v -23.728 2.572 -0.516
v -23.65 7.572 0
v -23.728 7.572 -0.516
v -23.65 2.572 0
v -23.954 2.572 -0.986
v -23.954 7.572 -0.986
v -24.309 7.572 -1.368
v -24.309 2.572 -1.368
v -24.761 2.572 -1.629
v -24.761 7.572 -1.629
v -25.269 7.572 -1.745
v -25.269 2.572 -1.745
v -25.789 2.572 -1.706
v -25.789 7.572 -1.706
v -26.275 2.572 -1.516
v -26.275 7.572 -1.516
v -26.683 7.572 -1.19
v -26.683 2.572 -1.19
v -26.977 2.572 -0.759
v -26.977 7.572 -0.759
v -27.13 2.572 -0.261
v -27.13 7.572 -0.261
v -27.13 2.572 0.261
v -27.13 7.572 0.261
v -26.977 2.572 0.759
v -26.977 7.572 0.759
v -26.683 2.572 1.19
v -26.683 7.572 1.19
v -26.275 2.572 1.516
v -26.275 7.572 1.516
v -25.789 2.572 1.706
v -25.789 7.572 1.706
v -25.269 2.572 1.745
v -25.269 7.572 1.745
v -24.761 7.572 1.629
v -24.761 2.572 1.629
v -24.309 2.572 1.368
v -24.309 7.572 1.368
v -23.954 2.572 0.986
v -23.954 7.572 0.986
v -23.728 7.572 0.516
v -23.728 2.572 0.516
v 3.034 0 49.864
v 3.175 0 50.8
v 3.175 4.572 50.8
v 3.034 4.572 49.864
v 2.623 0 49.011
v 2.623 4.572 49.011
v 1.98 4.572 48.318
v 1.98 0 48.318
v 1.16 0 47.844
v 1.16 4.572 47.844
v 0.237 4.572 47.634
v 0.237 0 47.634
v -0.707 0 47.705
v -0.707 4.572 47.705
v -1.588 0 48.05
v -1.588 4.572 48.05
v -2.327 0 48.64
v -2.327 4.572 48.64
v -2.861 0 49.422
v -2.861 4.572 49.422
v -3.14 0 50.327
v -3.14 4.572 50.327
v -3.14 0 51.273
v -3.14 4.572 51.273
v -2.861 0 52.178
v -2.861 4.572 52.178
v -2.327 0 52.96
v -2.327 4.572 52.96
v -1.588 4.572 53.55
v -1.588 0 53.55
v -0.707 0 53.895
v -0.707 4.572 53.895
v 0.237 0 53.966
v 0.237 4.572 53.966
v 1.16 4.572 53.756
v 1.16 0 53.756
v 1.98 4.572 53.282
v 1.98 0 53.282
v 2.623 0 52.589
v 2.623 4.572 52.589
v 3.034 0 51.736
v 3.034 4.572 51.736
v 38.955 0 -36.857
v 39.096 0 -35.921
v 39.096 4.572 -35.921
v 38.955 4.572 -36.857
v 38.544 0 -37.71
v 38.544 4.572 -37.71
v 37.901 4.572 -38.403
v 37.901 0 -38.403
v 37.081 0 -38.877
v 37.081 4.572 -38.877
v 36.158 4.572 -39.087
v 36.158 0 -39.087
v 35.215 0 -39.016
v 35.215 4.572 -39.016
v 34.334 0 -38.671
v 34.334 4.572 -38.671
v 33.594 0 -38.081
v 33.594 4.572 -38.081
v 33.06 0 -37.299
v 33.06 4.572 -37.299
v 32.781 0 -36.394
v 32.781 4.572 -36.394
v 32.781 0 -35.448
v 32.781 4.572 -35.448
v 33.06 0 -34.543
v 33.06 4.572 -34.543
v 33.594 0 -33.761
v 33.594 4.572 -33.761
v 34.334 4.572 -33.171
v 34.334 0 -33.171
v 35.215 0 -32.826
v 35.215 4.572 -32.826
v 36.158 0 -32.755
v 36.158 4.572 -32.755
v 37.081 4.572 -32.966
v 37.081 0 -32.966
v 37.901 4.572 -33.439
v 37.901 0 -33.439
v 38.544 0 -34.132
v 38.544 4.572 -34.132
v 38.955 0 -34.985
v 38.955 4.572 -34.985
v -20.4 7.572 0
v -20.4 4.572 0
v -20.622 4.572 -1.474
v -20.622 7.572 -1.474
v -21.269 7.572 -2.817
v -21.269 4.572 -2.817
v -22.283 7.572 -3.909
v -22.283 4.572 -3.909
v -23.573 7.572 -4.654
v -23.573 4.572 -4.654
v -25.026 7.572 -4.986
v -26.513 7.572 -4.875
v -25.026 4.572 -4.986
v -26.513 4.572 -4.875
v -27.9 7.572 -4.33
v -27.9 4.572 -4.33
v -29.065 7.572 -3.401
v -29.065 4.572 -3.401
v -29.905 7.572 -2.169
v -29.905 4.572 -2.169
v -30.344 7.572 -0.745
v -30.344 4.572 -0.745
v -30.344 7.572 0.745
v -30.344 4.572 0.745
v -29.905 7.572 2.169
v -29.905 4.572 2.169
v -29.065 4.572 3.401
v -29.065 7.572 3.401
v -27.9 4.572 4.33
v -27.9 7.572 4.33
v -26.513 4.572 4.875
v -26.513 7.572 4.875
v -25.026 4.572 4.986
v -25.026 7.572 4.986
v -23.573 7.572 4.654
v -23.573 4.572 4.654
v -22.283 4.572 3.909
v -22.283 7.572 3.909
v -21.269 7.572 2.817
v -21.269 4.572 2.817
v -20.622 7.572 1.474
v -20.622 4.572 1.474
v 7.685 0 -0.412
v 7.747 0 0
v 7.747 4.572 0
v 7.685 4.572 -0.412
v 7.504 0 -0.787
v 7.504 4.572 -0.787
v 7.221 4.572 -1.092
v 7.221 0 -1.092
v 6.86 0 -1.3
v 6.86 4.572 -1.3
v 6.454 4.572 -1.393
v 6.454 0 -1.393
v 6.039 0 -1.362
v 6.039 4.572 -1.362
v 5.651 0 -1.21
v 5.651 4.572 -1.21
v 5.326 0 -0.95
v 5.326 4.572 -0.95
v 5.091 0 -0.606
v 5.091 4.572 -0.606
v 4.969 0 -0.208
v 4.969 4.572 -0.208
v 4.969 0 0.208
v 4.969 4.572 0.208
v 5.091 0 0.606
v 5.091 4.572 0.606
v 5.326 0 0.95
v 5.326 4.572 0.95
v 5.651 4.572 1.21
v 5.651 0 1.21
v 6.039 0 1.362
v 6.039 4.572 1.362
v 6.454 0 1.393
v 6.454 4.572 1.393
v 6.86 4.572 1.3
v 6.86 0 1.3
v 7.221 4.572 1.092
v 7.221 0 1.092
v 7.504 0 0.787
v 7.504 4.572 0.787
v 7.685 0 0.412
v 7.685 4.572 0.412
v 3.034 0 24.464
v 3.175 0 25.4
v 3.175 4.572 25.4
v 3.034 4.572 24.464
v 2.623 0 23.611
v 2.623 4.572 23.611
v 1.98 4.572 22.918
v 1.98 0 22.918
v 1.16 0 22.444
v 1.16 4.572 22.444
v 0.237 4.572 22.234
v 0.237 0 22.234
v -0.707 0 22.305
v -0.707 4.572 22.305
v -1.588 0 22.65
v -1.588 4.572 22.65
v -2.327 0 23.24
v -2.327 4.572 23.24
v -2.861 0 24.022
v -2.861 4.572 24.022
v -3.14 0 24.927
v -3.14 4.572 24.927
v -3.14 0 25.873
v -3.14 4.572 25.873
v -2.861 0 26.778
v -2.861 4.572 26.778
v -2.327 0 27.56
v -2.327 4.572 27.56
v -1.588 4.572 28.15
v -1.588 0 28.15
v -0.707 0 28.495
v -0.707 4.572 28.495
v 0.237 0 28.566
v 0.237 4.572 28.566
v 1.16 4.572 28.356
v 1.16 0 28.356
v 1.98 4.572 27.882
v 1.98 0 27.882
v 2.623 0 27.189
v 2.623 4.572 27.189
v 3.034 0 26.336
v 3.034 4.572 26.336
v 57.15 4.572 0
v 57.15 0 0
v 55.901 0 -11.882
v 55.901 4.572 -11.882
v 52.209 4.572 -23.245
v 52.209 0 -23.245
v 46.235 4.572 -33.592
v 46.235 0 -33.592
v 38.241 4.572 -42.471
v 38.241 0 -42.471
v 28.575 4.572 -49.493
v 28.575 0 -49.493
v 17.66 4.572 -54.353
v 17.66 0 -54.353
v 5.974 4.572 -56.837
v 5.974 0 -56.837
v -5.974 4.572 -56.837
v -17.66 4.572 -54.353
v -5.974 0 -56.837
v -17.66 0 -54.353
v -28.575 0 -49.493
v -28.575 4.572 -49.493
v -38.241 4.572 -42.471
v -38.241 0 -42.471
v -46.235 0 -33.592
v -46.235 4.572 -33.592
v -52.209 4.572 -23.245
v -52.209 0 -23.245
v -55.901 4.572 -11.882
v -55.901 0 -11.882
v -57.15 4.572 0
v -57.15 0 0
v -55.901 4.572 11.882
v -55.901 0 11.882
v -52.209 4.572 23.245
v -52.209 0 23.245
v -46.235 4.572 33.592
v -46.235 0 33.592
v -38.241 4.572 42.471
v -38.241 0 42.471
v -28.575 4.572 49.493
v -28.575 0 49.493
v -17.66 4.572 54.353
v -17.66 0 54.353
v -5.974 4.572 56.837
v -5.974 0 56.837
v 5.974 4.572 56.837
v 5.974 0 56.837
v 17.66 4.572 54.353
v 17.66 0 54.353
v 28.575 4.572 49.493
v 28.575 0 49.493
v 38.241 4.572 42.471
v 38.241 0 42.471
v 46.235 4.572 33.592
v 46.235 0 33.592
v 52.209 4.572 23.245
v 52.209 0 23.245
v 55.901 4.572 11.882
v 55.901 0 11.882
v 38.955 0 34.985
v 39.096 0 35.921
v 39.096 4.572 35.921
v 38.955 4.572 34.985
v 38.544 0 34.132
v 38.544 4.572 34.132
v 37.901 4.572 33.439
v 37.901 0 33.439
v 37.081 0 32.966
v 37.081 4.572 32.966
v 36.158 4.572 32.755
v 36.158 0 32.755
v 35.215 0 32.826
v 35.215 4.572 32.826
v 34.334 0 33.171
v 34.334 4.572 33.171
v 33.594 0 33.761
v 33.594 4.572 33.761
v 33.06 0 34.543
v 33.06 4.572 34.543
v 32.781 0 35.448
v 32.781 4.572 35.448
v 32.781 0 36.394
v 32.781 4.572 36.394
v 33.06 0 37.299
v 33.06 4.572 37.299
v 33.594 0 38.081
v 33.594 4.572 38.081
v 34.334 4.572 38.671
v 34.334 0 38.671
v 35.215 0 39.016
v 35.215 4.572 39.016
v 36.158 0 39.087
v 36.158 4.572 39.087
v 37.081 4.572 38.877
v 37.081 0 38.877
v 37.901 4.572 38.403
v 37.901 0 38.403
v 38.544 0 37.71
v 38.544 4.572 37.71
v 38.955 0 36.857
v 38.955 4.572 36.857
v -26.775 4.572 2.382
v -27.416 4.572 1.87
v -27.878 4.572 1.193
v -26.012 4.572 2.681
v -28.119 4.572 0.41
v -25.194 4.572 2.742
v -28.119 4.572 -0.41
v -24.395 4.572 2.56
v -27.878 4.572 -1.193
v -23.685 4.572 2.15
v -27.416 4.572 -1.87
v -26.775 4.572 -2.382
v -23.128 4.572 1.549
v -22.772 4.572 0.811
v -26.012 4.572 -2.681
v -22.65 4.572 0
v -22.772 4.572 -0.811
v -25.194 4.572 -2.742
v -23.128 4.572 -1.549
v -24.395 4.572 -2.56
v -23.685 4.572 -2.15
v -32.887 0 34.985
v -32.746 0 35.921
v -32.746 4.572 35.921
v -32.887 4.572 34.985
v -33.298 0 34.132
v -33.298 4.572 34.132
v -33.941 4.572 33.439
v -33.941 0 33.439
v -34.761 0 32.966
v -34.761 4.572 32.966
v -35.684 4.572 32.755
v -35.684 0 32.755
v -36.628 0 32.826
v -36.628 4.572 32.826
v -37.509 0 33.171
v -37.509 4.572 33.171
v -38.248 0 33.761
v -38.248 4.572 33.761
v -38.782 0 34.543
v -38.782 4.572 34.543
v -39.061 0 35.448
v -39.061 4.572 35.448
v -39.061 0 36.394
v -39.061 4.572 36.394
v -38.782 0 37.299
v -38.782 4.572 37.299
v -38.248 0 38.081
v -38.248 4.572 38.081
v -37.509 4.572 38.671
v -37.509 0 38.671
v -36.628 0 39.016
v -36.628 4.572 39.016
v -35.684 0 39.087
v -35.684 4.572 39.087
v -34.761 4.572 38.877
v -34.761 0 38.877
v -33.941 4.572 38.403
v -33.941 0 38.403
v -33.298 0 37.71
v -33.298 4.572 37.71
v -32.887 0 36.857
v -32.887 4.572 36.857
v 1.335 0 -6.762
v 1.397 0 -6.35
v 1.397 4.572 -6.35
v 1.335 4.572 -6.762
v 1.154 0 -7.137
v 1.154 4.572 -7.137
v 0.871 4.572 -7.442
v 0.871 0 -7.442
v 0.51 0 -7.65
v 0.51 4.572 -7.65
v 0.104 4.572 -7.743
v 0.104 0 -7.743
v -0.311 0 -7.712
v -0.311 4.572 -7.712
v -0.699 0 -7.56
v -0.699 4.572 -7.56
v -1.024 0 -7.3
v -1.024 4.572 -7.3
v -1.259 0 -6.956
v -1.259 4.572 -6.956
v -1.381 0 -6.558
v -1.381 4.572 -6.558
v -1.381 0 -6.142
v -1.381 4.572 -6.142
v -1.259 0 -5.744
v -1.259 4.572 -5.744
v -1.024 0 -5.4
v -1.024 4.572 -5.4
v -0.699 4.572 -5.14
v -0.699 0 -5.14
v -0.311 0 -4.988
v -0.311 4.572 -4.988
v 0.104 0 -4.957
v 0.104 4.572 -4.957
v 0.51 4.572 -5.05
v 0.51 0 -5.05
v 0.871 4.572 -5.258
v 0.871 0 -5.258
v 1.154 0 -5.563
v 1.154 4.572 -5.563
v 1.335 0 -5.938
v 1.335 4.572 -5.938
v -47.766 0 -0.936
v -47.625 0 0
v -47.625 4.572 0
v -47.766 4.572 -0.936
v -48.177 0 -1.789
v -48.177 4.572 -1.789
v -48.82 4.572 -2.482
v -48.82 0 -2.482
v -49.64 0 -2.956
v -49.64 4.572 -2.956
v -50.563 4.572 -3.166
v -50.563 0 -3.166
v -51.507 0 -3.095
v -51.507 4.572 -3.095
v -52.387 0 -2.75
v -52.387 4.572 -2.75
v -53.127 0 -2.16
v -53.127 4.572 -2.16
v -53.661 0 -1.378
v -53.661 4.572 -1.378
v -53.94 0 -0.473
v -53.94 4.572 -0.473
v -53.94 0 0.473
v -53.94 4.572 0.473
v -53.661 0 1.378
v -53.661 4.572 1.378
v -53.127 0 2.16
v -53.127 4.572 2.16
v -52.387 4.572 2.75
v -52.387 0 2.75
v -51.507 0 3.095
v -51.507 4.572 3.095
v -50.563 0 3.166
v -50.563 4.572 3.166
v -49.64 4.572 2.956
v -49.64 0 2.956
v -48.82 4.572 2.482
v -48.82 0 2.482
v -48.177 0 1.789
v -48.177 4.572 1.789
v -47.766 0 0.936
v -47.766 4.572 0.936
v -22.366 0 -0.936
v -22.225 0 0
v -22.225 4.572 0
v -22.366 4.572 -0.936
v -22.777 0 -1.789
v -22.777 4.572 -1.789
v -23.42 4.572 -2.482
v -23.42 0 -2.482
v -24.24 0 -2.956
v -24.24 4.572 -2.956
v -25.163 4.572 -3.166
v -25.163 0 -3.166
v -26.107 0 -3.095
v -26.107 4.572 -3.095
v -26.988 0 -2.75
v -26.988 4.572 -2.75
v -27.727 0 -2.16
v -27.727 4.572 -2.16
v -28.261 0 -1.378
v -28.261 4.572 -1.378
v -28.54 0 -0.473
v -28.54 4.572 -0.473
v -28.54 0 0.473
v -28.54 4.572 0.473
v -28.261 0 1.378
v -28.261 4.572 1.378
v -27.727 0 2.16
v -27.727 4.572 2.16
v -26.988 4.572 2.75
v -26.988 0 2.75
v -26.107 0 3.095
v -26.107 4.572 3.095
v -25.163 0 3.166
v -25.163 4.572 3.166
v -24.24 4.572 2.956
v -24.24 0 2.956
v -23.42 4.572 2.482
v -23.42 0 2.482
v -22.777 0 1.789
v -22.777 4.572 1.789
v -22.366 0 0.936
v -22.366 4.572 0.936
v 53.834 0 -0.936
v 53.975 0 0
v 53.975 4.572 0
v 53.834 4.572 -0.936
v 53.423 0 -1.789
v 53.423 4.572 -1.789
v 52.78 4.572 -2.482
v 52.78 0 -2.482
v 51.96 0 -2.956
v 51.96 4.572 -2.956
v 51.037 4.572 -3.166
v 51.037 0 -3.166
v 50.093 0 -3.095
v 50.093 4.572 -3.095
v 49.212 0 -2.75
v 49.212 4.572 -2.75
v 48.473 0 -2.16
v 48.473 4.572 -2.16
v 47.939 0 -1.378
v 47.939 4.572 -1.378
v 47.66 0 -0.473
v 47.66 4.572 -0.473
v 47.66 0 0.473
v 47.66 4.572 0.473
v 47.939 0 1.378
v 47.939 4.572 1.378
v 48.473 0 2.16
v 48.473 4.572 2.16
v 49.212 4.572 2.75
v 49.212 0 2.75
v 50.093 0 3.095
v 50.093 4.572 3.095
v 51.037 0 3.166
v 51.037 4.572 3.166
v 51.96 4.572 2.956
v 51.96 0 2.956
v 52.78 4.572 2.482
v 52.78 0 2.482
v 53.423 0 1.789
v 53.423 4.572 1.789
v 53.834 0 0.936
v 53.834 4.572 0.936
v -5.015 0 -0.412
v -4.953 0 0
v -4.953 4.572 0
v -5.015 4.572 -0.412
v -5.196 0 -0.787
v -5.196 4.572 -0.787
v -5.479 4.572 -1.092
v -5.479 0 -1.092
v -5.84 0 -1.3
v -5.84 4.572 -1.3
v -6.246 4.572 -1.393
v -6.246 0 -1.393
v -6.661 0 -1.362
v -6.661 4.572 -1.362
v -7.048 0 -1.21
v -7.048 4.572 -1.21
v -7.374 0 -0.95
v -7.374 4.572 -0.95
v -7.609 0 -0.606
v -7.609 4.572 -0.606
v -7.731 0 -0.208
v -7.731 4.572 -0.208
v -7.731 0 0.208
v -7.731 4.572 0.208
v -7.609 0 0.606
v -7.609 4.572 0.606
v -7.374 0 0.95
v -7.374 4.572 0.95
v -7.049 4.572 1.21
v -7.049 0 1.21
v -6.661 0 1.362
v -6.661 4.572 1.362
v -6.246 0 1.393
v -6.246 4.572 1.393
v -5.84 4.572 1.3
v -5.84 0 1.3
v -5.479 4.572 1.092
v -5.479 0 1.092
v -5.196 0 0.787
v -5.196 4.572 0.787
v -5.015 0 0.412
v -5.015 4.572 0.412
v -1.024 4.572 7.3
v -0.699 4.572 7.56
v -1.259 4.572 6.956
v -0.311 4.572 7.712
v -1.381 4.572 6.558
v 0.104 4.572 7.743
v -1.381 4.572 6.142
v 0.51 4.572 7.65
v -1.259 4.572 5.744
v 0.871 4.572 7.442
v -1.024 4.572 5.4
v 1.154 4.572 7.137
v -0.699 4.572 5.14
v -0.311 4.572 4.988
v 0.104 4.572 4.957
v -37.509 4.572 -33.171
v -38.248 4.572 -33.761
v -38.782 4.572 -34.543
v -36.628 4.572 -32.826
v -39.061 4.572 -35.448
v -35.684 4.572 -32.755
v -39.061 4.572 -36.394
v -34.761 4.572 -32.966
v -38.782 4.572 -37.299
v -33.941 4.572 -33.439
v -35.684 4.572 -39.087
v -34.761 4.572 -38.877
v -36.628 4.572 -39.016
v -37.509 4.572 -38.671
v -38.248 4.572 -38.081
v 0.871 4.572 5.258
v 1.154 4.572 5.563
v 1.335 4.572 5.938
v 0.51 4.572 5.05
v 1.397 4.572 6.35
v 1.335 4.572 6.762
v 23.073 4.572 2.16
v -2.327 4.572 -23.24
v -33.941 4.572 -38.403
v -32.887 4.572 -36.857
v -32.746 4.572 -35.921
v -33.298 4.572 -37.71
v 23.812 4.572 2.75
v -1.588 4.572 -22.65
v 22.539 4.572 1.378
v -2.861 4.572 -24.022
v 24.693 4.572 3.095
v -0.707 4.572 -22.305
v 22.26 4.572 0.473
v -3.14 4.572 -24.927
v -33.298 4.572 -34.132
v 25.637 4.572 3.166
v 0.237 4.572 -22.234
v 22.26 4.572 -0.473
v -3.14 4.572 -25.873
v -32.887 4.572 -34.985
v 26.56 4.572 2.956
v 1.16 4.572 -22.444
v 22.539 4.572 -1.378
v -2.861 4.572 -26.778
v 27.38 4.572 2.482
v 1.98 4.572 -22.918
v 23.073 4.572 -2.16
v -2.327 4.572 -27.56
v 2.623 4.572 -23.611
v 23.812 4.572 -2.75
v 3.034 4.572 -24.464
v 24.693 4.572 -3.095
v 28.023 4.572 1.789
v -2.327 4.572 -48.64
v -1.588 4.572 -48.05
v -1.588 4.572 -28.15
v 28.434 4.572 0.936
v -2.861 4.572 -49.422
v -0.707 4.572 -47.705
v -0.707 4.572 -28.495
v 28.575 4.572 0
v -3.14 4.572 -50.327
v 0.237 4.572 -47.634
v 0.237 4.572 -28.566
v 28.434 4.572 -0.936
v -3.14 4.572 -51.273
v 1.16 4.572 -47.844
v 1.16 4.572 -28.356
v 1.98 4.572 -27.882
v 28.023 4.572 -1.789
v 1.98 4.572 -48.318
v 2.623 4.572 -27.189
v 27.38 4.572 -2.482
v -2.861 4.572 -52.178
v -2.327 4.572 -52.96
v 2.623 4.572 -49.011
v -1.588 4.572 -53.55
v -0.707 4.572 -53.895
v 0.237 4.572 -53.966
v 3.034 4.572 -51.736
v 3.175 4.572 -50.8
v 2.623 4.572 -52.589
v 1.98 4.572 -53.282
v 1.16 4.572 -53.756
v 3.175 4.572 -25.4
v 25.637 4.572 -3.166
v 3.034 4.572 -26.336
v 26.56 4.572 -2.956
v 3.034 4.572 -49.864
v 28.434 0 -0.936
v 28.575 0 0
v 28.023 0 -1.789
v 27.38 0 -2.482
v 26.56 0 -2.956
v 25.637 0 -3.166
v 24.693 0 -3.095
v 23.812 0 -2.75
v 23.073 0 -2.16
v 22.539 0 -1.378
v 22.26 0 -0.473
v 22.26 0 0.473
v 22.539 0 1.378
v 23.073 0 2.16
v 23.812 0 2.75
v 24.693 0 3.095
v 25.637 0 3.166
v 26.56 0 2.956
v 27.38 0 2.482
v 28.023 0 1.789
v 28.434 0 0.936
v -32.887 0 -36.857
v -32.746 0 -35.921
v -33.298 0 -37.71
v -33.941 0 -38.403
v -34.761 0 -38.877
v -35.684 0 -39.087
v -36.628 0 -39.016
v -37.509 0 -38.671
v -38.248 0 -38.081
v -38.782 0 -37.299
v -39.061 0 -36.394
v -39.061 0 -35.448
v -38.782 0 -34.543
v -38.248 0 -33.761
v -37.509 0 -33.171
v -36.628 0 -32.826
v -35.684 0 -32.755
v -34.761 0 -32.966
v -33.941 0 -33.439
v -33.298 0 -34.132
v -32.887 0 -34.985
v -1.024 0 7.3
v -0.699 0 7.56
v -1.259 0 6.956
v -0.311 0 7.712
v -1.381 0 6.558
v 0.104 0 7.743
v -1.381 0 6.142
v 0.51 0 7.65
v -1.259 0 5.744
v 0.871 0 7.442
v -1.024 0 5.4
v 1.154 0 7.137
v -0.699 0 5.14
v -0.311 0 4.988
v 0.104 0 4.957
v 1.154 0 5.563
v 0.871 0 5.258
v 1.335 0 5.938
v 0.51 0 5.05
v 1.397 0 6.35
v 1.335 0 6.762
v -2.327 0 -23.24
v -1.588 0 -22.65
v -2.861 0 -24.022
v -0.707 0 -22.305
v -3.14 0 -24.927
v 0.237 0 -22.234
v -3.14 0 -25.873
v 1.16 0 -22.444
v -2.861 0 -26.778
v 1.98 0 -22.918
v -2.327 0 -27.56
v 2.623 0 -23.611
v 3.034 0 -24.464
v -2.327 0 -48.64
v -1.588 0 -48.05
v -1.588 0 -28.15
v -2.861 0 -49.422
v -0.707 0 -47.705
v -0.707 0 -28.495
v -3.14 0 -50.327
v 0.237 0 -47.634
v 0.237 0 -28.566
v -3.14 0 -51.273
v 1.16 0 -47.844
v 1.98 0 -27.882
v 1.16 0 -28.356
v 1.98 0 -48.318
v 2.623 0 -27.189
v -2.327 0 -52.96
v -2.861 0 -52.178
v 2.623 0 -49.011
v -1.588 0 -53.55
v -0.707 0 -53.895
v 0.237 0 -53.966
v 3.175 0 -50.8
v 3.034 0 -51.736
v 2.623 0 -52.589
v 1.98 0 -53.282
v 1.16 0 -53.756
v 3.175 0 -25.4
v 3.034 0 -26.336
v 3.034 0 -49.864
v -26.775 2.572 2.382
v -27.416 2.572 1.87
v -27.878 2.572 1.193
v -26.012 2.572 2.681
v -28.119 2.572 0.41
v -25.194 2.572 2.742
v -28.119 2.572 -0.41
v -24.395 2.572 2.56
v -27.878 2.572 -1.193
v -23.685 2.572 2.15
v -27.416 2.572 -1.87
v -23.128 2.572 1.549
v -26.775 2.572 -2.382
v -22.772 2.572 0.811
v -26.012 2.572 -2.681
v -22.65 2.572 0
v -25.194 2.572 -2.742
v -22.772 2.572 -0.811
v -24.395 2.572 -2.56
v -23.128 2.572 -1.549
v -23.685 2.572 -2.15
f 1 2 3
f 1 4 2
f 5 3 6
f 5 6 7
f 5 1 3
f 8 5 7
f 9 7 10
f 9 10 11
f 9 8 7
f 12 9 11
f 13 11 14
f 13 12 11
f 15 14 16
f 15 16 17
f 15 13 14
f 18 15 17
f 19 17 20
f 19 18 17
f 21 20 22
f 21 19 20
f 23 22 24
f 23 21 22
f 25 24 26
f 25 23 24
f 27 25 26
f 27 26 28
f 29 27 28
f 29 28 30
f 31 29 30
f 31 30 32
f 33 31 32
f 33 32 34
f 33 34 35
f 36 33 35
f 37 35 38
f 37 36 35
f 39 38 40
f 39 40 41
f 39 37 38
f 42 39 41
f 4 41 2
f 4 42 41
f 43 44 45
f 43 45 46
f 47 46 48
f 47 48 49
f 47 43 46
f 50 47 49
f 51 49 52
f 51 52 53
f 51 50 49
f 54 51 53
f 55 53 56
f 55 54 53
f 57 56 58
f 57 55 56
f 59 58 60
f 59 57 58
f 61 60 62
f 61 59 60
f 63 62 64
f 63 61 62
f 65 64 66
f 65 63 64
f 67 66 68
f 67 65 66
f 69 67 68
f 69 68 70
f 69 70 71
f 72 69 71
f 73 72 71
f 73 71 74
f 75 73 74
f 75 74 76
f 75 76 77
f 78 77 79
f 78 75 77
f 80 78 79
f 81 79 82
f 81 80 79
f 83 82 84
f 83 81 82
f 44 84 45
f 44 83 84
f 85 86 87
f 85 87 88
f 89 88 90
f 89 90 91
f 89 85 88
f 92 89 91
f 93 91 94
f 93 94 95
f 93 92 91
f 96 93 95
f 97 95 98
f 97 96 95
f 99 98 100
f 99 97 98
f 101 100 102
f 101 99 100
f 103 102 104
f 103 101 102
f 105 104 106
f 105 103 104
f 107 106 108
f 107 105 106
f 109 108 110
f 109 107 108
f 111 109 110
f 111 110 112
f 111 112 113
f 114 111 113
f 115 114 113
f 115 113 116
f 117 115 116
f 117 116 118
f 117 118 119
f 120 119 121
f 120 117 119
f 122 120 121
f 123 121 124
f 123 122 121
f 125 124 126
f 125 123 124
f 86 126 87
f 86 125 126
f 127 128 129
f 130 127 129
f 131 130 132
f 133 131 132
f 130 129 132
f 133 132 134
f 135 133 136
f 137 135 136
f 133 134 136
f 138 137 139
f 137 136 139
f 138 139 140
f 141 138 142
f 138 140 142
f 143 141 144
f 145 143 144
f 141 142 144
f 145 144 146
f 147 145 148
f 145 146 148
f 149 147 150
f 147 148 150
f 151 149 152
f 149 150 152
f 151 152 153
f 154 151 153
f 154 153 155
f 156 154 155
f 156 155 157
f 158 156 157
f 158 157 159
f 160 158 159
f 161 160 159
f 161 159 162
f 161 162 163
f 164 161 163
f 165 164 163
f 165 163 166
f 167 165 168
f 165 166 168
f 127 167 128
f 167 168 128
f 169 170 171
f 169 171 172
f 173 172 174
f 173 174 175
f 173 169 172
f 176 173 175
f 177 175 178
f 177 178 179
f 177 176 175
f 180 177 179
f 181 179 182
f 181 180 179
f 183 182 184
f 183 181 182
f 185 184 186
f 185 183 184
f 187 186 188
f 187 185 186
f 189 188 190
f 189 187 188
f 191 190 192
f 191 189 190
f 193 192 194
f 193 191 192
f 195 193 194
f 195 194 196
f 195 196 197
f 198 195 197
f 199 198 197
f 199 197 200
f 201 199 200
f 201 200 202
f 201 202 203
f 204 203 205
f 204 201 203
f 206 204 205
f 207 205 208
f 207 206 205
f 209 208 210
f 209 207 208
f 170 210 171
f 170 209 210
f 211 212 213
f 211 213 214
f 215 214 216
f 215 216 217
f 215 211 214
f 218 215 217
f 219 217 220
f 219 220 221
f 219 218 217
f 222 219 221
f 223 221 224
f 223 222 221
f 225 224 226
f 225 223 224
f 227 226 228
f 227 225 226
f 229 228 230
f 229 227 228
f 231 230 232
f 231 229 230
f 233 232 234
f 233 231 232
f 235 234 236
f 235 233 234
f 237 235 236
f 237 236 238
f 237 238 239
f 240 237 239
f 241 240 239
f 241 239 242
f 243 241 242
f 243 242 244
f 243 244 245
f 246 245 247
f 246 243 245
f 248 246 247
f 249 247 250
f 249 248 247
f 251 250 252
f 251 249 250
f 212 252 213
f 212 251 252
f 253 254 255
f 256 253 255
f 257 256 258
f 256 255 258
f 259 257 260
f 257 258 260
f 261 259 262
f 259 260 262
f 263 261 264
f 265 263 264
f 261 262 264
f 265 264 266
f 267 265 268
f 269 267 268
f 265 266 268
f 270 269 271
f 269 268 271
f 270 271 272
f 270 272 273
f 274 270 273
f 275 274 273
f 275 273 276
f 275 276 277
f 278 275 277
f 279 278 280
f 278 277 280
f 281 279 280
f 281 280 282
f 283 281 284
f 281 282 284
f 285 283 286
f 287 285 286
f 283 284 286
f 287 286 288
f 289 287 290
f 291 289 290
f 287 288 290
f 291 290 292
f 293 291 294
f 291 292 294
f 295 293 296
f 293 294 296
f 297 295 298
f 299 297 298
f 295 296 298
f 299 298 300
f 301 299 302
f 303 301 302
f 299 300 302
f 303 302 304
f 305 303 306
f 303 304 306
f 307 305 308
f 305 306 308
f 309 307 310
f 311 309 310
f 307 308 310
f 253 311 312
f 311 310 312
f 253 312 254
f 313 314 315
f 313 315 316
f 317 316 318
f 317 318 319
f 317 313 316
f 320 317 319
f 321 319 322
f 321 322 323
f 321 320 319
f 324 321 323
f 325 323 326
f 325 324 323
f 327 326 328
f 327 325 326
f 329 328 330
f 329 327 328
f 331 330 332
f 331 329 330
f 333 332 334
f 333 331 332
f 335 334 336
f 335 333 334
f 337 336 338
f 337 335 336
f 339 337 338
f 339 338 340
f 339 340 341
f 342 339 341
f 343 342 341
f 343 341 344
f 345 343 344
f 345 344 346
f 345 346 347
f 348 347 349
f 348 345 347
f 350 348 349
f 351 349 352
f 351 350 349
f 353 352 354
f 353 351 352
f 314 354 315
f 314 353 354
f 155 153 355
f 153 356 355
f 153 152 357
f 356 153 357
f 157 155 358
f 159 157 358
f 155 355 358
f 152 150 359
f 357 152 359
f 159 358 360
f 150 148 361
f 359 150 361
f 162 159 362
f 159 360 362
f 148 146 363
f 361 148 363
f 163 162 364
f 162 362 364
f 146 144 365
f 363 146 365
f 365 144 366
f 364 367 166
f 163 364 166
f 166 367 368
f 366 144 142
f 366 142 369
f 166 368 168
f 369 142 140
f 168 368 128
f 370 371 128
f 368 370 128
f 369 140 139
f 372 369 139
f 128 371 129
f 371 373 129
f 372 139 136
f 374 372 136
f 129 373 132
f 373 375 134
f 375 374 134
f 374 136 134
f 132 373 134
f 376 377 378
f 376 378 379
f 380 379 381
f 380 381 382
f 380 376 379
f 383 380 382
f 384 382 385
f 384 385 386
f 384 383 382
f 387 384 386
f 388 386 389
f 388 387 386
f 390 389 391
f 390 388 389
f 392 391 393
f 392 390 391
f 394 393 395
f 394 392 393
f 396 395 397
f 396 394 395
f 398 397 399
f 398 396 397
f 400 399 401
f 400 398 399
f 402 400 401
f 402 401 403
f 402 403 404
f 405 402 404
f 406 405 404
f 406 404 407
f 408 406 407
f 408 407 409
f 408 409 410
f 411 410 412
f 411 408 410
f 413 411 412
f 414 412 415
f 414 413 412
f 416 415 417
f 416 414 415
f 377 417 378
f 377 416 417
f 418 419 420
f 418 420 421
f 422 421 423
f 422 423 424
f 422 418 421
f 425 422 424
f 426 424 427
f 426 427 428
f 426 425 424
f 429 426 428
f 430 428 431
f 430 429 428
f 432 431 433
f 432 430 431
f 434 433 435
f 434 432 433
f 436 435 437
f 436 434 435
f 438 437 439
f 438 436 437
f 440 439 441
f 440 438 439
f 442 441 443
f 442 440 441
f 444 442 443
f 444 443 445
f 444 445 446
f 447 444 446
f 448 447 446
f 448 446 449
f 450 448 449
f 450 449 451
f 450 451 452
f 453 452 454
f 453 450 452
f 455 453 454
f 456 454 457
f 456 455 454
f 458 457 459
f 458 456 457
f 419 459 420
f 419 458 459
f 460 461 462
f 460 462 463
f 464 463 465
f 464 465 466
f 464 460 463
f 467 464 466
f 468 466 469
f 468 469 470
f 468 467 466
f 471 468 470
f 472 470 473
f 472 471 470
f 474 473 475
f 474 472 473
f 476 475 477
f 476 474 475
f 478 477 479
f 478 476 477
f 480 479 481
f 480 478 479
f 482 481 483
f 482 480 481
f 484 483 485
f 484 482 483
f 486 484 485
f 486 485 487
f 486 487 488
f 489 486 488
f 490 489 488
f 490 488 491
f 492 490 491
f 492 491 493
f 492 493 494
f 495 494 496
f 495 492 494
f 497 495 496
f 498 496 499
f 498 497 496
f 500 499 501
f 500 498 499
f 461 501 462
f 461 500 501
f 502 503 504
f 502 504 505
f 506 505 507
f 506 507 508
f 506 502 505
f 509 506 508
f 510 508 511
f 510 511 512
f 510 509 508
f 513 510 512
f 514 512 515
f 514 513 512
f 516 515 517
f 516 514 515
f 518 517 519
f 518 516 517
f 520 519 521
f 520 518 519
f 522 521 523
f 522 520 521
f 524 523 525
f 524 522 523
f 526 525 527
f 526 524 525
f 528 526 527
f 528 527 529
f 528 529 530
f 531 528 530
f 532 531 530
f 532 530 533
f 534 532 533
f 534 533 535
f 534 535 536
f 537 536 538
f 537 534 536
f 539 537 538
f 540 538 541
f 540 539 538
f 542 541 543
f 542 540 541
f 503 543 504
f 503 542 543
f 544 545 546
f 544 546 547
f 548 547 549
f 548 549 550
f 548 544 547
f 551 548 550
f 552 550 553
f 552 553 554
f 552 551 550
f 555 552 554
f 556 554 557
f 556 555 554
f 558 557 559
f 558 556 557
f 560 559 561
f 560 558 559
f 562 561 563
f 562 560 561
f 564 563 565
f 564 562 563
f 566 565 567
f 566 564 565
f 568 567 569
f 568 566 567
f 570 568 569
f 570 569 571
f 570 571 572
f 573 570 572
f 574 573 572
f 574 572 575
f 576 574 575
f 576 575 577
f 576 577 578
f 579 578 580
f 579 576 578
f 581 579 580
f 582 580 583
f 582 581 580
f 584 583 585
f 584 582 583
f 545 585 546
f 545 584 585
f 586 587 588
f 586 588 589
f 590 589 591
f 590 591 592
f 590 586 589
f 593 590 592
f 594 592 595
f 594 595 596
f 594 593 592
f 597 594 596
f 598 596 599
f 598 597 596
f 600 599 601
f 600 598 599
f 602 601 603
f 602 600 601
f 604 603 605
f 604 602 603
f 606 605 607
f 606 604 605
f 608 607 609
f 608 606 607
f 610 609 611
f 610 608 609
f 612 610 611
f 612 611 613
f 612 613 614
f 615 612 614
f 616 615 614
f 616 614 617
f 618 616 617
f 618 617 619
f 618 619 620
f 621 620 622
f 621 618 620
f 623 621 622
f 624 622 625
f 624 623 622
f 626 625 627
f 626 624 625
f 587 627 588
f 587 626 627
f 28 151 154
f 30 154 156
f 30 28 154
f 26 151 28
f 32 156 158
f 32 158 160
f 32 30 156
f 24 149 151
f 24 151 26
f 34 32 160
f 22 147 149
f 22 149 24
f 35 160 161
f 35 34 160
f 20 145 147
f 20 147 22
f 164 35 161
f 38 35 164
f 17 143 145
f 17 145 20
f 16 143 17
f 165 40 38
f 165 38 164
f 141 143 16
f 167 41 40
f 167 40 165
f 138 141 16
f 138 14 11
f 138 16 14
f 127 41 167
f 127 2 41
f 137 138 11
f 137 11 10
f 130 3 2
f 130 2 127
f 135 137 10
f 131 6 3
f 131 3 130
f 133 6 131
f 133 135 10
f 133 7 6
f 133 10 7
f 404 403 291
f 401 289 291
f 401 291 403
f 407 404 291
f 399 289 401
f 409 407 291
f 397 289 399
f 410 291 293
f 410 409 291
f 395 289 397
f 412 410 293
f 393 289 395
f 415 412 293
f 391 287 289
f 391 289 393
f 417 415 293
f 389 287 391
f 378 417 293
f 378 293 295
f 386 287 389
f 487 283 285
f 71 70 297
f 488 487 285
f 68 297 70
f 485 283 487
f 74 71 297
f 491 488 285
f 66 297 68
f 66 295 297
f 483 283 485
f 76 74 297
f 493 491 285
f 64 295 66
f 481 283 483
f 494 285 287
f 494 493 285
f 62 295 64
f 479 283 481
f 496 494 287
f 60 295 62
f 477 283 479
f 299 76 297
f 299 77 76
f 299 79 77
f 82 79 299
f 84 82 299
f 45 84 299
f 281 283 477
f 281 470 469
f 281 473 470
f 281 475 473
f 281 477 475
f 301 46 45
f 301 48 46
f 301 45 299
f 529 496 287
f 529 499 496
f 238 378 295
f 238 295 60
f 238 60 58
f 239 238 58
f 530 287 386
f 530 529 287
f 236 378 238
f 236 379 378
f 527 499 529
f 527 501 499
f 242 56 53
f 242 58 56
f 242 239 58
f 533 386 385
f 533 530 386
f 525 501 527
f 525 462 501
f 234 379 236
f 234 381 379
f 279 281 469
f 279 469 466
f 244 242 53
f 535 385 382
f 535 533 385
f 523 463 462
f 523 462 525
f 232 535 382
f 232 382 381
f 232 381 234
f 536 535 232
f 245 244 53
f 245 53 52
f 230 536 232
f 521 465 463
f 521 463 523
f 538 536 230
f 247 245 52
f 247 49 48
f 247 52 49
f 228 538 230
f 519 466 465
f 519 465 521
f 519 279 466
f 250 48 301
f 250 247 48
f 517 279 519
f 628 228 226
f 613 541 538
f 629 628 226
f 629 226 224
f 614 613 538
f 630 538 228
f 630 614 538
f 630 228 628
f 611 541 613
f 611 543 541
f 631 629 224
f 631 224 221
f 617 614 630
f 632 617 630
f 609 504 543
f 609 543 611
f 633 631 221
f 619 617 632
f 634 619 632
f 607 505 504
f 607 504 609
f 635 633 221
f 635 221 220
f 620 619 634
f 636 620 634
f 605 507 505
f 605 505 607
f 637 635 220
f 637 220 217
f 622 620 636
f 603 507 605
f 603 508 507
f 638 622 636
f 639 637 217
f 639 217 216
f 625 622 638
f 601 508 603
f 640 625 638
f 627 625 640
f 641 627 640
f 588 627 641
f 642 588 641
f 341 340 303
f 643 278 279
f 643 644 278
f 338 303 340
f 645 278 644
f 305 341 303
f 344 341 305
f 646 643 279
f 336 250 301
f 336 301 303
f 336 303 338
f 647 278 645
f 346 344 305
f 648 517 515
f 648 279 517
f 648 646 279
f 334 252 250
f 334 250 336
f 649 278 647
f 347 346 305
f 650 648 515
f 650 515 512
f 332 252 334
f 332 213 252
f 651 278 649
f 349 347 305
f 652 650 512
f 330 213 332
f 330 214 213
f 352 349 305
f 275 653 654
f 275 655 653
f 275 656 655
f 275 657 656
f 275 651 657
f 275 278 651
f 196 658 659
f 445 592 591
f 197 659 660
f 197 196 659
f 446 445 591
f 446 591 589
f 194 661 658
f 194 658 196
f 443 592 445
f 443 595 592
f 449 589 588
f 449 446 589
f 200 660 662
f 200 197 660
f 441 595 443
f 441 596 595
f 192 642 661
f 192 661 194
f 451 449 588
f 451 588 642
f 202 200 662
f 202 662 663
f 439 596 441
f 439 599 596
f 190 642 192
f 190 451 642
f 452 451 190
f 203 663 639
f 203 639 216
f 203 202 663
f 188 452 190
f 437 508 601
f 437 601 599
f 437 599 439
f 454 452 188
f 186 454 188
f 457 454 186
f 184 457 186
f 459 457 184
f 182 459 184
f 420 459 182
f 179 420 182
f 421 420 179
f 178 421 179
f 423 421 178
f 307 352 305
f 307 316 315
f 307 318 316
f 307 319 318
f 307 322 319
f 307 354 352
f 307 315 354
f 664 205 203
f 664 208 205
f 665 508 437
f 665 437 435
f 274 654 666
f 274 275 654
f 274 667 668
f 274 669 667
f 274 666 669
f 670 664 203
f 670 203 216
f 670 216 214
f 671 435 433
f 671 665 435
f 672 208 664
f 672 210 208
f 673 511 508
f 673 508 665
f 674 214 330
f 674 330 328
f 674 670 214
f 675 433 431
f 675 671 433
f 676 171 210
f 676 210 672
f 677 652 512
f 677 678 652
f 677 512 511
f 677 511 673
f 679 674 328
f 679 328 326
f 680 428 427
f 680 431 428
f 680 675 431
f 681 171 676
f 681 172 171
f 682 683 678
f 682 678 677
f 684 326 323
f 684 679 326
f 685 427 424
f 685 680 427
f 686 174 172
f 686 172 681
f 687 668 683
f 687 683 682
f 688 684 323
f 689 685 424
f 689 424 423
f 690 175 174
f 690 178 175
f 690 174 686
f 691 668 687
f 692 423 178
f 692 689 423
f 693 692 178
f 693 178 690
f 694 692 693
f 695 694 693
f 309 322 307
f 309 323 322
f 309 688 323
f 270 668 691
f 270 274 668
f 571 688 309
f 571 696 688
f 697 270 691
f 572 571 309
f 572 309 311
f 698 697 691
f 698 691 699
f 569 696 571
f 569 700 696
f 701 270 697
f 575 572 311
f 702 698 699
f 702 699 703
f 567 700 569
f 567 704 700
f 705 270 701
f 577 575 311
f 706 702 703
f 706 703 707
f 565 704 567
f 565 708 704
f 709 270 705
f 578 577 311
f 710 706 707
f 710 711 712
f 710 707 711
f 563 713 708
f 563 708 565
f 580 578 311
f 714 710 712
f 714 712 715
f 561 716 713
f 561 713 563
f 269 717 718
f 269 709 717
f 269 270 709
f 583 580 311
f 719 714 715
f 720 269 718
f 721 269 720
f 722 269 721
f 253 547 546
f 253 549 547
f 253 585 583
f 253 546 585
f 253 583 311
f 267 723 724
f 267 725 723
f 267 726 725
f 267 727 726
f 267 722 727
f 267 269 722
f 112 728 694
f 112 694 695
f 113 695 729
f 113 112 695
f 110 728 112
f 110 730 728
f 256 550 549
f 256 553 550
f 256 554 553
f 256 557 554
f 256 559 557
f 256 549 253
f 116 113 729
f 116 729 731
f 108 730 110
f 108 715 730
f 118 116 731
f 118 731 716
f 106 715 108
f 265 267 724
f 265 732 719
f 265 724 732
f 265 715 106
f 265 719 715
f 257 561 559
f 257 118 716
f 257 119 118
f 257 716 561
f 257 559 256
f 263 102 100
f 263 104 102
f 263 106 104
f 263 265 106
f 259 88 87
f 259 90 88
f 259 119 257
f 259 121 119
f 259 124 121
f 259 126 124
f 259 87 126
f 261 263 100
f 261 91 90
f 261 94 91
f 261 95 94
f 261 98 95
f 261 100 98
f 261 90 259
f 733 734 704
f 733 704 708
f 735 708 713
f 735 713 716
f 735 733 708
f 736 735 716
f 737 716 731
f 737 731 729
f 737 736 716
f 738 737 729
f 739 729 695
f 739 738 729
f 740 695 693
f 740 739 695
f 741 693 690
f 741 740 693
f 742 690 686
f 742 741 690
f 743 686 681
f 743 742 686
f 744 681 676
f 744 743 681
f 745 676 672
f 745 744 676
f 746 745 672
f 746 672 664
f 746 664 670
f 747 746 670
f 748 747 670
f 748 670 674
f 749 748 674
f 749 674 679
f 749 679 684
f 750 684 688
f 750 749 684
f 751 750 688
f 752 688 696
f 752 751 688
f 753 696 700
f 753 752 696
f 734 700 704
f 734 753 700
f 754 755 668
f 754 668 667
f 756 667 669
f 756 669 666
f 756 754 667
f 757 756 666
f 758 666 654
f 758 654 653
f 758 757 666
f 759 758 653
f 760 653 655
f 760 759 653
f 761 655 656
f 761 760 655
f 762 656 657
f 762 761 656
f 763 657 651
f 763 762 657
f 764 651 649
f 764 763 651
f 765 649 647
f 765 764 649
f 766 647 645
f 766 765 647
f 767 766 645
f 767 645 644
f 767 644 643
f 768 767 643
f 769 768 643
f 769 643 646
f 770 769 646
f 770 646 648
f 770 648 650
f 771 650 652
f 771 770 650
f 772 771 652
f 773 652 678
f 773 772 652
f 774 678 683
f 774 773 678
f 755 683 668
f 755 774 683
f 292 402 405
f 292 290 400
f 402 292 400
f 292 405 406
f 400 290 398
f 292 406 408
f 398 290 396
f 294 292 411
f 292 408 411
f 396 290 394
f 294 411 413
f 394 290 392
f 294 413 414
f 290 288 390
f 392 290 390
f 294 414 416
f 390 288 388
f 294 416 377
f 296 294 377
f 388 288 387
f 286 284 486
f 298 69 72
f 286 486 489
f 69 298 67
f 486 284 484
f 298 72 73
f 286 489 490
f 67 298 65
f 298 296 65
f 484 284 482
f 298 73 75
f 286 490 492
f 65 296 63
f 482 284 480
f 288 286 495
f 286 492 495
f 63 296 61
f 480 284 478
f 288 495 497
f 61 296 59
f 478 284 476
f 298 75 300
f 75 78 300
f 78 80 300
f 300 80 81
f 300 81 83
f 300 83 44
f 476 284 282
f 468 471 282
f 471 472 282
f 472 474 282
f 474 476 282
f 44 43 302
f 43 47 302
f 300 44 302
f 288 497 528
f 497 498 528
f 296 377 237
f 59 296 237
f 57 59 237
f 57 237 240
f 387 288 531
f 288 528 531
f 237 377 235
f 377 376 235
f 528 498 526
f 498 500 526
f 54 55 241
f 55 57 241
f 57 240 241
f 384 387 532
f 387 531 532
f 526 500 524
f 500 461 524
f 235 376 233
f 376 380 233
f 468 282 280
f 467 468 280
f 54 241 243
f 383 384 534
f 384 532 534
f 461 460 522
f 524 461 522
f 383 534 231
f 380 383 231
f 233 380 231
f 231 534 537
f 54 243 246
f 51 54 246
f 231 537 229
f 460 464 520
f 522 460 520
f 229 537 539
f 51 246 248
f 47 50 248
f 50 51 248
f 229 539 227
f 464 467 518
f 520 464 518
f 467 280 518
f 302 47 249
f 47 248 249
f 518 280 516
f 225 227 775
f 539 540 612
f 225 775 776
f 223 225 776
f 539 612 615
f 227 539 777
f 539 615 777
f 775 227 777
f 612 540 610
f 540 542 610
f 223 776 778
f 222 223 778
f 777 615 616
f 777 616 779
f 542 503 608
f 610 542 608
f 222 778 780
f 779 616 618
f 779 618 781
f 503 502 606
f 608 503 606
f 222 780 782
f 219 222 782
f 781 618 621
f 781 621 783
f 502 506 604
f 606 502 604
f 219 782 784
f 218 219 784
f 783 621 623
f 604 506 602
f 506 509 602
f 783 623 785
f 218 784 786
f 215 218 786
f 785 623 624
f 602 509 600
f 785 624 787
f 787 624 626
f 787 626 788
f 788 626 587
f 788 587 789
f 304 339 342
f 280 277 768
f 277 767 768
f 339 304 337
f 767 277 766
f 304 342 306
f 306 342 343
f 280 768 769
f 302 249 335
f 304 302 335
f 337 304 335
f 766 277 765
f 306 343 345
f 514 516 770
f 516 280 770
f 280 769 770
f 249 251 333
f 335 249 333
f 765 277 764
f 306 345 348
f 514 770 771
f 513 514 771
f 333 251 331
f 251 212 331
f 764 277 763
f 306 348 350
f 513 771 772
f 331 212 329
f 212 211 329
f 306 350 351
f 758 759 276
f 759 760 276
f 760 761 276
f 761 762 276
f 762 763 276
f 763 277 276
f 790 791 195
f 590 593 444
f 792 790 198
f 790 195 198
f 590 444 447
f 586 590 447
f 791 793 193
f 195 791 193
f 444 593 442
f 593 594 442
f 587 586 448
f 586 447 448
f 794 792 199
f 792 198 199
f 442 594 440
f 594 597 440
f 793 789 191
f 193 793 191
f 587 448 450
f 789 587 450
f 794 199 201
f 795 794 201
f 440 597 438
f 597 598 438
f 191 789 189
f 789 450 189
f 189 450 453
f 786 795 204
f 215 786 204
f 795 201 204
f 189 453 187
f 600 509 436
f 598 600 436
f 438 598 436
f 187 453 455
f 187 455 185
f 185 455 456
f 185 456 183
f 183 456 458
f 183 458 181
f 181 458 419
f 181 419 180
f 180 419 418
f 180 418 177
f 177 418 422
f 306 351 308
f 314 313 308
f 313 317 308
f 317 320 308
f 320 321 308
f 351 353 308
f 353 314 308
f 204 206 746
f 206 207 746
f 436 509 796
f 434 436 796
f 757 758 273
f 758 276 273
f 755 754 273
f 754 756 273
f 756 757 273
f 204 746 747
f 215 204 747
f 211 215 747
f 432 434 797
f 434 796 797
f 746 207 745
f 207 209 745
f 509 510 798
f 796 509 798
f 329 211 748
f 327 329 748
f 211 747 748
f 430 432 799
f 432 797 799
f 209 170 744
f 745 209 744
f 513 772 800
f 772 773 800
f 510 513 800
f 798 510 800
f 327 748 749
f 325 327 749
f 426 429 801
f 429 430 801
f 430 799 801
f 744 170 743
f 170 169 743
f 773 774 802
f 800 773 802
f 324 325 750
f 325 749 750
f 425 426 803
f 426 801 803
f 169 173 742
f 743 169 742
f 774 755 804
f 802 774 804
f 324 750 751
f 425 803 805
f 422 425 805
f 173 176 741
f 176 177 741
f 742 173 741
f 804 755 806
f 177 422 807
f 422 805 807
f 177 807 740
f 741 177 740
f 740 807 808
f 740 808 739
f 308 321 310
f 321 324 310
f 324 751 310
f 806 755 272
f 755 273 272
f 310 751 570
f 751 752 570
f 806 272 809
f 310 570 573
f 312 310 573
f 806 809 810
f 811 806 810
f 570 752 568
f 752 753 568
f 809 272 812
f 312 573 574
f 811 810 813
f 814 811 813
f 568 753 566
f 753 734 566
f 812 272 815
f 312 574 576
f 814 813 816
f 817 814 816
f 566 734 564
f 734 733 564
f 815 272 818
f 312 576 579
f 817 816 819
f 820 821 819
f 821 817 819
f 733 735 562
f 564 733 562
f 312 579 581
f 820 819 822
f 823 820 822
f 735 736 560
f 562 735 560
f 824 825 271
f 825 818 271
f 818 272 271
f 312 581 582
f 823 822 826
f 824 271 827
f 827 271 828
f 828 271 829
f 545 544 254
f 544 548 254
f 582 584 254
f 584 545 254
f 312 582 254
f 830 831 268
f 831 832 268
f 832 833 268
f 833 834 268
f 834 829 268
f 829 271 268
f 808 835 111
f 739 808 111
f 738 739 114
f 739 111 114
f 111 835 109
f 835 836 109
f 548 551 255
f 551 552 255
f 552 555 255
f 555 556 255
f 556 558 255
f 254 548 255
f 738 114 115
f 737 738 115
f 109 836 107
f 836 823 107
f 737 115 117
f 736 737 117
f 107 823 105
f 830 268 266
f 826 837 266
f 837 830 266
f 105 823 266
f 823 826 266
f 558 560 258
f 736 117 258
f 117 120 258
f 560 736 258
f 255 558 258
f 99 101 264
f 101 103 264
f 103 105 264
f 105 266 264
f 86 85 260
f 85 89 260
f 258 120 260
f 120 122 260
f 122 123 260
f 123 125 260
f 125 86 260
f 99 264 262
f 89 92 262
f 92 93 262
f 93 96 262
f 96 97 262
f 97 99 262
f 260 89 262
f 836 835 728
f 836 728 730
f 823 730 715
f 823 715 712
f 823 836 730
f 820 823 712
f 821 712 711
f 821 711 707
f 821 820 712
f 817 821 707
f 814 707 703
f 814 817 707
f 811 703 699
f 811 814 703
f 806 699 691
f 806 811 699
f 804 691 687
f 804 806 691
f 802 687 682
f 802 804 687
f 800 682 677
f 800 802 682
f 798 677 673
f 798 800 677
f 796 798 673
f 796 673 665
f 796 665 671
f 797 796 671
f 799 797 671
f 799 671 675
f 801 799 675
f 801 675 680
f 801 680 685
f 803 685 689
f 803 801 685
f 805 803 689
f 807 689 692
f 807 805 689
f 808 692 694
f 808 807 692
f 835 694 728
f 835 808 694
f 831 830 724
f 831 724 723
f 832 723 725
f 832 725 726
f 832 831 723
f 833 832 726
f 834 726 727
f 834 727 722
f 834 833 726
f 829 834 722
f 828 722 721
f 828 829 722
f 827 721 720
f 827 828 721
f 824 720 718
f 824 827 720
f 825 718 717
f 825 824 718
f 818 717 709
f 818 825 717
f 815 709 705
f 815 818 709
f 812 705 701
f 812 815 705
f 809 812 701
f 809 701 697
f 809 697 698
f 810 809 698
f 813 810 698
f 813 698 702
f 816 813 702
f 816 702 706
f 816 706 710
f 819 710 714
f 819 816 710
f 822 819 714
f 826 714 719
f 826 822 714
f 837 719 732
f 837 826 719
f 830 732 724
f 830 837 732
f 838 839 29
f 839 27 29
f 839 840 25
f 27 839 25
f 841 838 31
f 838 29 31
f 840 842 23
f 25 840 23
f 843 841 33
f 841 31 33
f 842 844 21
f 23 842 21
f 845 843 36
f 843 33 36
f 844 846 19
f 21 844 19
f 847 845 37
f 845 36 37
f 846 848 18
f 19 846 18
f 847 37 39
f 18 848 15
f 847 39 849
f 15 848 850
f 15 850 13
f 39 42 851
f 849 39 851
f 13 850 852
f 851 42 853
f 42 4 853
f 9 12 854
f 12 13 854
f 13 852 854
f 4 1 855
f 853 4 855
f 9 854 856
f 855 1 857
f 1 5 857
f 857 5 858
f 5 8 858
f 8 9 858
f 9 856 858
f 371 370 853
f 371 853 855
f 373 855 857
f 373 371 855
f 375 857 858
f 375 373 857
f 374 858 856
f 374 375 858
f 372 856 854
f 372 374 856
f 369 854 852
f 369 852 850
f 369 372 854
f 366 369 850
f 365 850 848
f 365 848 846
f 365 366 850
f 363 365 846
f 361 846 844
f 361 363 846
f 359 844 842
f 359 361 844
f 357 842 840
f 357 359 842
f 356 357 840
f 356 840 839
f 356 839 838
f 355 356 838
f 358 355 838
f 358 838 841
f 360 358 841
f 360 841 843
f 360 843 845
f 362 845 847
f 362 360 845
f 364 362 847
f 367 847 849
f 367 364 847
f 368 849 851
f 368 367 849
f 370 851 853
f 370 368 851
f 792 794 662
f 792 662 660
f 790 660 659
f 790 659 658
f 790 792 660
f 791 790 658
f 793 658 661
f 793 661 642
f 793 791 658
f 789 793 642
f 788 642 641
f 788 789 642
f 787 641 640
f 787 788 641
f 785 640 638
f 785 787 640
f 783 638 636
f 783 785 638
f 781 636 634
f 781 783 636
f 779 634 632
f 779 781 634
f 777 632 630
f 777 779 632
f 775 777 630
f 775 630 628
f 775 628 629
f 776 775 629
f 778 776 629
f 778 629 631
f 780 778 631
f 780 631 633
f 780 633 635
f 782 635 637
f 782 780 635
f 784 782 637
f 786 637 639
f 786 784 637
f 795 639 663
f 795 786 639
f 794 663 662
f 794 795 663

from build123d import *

# Parameters (mm, degrees)
SKETCH1_R           = 57.15
SKETCH1_R_2         = 1.397
SKETCH1_R_3         = 3.175
BOSS_EXTRUDE1_DEPTH = 4.572
SKETCH2_R           = 2.75
SKETCH2_R_2         = 1.75
BOSS_EXTRUDE2_DEPTH = 2
SKETCH3_R           = 5
SKETCH3_R_2         = 1.75
BOSS_EXTRUDE3_DEPTH = 3


with BuildPart() as part:
    # Sketch1 → Boss-Extrude1 (new body)
    with BuildSketch(Plane(origin=(0, 0, 0), x_dir=(1, 0, 0), z_dir=(0, 1, 0))):
        Circle(SKETCH1_R)
        with Locations((0, 6.35)):
            Circle(SKETCH1_R_2, mode=Mode.SUBTRACT)
        with Locations((0, 25.4)):
            Circle(SKETCH1_R_3, mode=Mode.SUBTRACT)
        with Locations((0, 50.8)):
            Circle(SKETCH1_R_3, mode=Mode.SUBTRACT)
        with Locations((25.4, 0)):
            Circle(SKETCH1_R_3, mode=Mode.SUBTRACT)
        with Locations((0, -25.4)):
            Circle(SKETCH1_R_3, mode=Mode.SUBTRACT)
        with Locations((-25.4, 0)):
            Circle(SKETCH1_R_3, mode=Mode.SUBTRACT)
        with Locations((6.35, 0)):
            Circle(SKETCH1_R_2, mode=Mode.SUBTRACT)
        with Locations((0, -6.35)):
            Circle(SKETCH1_R_2, mode=Mode.SUBTRACT)
        with Locations((-6.35, 0)):
            Circle(SKETCH1_R_2, mode=Mode.SUBTRACT)
        with Locations((35.921024484, 35.921024484)):
            Circle(SKETCH1_R_3, mode=Mode.SUBTRACT)
        with Locations((50.8, 0)):
            Circle(SKETCH1_R_3, mode=Mode.SUBTRACT)
        with Locations((35.921024484, -35.921024484)):
            Circle(SKETCH1_R_3, mode=Mode.SUBTRACT)
        with Locations((0, -50.8)):
            Circle(SKETCH1_R_3, mode=Mode.SUBTRACT)
        with Locations((-35.921024484, -35.921024484)):
            Circle(SKETCH1_R_3, mode=Mode.SUBTRACT)
        with Locations((-50.8, 0)):
            Circle(SKETCH1_R_3, mode=Mode.SUBTRACT)
        with Locations((-35.921024484, 35.921024484)):
            Circle(SKETCH1_R_3, mode=Mode.SUBTRACT)
    extrude(amount=BOSS_EXTRUDE1_DEPTH)


with BuildPart() as body_2:
    # Sketch2 → Boss-Extrude2 (new body)
    with BuildSketch(Plane(origin=(0, 4.572, 0), x_dir=(1, 0, 0), z_dir=(0, 1, 0))):
        with Locations((-25.4, 0)):
            Circle(SKETCH2_R)
        with Locations((-25.4, 0)):
            Circle(SKETCH2_R_2, mode=Mode.SUBTRACT)
    extrude(amount=-BOSS_EXTRUDE2_DEPTH)

    # Sketch3 → Boss-Extrude3 (add)
    with BuildSketch(Plane(origin=(0, 4.572, 0), x_dir=(1, 0, 0), z_dir=(0, 1, 0))):
        with Locations((-25.4, 0)):
            Circle(SKETCH3_R)
        with Locations((-25.4, 0)):
            Circle(SKETCH3_R_2, mode=Mode.SUBTRACT)
    extrude(amount=BOSS_EXTRUDE3_DEPTH)


solid = Compound([part.part, body_2.part])
